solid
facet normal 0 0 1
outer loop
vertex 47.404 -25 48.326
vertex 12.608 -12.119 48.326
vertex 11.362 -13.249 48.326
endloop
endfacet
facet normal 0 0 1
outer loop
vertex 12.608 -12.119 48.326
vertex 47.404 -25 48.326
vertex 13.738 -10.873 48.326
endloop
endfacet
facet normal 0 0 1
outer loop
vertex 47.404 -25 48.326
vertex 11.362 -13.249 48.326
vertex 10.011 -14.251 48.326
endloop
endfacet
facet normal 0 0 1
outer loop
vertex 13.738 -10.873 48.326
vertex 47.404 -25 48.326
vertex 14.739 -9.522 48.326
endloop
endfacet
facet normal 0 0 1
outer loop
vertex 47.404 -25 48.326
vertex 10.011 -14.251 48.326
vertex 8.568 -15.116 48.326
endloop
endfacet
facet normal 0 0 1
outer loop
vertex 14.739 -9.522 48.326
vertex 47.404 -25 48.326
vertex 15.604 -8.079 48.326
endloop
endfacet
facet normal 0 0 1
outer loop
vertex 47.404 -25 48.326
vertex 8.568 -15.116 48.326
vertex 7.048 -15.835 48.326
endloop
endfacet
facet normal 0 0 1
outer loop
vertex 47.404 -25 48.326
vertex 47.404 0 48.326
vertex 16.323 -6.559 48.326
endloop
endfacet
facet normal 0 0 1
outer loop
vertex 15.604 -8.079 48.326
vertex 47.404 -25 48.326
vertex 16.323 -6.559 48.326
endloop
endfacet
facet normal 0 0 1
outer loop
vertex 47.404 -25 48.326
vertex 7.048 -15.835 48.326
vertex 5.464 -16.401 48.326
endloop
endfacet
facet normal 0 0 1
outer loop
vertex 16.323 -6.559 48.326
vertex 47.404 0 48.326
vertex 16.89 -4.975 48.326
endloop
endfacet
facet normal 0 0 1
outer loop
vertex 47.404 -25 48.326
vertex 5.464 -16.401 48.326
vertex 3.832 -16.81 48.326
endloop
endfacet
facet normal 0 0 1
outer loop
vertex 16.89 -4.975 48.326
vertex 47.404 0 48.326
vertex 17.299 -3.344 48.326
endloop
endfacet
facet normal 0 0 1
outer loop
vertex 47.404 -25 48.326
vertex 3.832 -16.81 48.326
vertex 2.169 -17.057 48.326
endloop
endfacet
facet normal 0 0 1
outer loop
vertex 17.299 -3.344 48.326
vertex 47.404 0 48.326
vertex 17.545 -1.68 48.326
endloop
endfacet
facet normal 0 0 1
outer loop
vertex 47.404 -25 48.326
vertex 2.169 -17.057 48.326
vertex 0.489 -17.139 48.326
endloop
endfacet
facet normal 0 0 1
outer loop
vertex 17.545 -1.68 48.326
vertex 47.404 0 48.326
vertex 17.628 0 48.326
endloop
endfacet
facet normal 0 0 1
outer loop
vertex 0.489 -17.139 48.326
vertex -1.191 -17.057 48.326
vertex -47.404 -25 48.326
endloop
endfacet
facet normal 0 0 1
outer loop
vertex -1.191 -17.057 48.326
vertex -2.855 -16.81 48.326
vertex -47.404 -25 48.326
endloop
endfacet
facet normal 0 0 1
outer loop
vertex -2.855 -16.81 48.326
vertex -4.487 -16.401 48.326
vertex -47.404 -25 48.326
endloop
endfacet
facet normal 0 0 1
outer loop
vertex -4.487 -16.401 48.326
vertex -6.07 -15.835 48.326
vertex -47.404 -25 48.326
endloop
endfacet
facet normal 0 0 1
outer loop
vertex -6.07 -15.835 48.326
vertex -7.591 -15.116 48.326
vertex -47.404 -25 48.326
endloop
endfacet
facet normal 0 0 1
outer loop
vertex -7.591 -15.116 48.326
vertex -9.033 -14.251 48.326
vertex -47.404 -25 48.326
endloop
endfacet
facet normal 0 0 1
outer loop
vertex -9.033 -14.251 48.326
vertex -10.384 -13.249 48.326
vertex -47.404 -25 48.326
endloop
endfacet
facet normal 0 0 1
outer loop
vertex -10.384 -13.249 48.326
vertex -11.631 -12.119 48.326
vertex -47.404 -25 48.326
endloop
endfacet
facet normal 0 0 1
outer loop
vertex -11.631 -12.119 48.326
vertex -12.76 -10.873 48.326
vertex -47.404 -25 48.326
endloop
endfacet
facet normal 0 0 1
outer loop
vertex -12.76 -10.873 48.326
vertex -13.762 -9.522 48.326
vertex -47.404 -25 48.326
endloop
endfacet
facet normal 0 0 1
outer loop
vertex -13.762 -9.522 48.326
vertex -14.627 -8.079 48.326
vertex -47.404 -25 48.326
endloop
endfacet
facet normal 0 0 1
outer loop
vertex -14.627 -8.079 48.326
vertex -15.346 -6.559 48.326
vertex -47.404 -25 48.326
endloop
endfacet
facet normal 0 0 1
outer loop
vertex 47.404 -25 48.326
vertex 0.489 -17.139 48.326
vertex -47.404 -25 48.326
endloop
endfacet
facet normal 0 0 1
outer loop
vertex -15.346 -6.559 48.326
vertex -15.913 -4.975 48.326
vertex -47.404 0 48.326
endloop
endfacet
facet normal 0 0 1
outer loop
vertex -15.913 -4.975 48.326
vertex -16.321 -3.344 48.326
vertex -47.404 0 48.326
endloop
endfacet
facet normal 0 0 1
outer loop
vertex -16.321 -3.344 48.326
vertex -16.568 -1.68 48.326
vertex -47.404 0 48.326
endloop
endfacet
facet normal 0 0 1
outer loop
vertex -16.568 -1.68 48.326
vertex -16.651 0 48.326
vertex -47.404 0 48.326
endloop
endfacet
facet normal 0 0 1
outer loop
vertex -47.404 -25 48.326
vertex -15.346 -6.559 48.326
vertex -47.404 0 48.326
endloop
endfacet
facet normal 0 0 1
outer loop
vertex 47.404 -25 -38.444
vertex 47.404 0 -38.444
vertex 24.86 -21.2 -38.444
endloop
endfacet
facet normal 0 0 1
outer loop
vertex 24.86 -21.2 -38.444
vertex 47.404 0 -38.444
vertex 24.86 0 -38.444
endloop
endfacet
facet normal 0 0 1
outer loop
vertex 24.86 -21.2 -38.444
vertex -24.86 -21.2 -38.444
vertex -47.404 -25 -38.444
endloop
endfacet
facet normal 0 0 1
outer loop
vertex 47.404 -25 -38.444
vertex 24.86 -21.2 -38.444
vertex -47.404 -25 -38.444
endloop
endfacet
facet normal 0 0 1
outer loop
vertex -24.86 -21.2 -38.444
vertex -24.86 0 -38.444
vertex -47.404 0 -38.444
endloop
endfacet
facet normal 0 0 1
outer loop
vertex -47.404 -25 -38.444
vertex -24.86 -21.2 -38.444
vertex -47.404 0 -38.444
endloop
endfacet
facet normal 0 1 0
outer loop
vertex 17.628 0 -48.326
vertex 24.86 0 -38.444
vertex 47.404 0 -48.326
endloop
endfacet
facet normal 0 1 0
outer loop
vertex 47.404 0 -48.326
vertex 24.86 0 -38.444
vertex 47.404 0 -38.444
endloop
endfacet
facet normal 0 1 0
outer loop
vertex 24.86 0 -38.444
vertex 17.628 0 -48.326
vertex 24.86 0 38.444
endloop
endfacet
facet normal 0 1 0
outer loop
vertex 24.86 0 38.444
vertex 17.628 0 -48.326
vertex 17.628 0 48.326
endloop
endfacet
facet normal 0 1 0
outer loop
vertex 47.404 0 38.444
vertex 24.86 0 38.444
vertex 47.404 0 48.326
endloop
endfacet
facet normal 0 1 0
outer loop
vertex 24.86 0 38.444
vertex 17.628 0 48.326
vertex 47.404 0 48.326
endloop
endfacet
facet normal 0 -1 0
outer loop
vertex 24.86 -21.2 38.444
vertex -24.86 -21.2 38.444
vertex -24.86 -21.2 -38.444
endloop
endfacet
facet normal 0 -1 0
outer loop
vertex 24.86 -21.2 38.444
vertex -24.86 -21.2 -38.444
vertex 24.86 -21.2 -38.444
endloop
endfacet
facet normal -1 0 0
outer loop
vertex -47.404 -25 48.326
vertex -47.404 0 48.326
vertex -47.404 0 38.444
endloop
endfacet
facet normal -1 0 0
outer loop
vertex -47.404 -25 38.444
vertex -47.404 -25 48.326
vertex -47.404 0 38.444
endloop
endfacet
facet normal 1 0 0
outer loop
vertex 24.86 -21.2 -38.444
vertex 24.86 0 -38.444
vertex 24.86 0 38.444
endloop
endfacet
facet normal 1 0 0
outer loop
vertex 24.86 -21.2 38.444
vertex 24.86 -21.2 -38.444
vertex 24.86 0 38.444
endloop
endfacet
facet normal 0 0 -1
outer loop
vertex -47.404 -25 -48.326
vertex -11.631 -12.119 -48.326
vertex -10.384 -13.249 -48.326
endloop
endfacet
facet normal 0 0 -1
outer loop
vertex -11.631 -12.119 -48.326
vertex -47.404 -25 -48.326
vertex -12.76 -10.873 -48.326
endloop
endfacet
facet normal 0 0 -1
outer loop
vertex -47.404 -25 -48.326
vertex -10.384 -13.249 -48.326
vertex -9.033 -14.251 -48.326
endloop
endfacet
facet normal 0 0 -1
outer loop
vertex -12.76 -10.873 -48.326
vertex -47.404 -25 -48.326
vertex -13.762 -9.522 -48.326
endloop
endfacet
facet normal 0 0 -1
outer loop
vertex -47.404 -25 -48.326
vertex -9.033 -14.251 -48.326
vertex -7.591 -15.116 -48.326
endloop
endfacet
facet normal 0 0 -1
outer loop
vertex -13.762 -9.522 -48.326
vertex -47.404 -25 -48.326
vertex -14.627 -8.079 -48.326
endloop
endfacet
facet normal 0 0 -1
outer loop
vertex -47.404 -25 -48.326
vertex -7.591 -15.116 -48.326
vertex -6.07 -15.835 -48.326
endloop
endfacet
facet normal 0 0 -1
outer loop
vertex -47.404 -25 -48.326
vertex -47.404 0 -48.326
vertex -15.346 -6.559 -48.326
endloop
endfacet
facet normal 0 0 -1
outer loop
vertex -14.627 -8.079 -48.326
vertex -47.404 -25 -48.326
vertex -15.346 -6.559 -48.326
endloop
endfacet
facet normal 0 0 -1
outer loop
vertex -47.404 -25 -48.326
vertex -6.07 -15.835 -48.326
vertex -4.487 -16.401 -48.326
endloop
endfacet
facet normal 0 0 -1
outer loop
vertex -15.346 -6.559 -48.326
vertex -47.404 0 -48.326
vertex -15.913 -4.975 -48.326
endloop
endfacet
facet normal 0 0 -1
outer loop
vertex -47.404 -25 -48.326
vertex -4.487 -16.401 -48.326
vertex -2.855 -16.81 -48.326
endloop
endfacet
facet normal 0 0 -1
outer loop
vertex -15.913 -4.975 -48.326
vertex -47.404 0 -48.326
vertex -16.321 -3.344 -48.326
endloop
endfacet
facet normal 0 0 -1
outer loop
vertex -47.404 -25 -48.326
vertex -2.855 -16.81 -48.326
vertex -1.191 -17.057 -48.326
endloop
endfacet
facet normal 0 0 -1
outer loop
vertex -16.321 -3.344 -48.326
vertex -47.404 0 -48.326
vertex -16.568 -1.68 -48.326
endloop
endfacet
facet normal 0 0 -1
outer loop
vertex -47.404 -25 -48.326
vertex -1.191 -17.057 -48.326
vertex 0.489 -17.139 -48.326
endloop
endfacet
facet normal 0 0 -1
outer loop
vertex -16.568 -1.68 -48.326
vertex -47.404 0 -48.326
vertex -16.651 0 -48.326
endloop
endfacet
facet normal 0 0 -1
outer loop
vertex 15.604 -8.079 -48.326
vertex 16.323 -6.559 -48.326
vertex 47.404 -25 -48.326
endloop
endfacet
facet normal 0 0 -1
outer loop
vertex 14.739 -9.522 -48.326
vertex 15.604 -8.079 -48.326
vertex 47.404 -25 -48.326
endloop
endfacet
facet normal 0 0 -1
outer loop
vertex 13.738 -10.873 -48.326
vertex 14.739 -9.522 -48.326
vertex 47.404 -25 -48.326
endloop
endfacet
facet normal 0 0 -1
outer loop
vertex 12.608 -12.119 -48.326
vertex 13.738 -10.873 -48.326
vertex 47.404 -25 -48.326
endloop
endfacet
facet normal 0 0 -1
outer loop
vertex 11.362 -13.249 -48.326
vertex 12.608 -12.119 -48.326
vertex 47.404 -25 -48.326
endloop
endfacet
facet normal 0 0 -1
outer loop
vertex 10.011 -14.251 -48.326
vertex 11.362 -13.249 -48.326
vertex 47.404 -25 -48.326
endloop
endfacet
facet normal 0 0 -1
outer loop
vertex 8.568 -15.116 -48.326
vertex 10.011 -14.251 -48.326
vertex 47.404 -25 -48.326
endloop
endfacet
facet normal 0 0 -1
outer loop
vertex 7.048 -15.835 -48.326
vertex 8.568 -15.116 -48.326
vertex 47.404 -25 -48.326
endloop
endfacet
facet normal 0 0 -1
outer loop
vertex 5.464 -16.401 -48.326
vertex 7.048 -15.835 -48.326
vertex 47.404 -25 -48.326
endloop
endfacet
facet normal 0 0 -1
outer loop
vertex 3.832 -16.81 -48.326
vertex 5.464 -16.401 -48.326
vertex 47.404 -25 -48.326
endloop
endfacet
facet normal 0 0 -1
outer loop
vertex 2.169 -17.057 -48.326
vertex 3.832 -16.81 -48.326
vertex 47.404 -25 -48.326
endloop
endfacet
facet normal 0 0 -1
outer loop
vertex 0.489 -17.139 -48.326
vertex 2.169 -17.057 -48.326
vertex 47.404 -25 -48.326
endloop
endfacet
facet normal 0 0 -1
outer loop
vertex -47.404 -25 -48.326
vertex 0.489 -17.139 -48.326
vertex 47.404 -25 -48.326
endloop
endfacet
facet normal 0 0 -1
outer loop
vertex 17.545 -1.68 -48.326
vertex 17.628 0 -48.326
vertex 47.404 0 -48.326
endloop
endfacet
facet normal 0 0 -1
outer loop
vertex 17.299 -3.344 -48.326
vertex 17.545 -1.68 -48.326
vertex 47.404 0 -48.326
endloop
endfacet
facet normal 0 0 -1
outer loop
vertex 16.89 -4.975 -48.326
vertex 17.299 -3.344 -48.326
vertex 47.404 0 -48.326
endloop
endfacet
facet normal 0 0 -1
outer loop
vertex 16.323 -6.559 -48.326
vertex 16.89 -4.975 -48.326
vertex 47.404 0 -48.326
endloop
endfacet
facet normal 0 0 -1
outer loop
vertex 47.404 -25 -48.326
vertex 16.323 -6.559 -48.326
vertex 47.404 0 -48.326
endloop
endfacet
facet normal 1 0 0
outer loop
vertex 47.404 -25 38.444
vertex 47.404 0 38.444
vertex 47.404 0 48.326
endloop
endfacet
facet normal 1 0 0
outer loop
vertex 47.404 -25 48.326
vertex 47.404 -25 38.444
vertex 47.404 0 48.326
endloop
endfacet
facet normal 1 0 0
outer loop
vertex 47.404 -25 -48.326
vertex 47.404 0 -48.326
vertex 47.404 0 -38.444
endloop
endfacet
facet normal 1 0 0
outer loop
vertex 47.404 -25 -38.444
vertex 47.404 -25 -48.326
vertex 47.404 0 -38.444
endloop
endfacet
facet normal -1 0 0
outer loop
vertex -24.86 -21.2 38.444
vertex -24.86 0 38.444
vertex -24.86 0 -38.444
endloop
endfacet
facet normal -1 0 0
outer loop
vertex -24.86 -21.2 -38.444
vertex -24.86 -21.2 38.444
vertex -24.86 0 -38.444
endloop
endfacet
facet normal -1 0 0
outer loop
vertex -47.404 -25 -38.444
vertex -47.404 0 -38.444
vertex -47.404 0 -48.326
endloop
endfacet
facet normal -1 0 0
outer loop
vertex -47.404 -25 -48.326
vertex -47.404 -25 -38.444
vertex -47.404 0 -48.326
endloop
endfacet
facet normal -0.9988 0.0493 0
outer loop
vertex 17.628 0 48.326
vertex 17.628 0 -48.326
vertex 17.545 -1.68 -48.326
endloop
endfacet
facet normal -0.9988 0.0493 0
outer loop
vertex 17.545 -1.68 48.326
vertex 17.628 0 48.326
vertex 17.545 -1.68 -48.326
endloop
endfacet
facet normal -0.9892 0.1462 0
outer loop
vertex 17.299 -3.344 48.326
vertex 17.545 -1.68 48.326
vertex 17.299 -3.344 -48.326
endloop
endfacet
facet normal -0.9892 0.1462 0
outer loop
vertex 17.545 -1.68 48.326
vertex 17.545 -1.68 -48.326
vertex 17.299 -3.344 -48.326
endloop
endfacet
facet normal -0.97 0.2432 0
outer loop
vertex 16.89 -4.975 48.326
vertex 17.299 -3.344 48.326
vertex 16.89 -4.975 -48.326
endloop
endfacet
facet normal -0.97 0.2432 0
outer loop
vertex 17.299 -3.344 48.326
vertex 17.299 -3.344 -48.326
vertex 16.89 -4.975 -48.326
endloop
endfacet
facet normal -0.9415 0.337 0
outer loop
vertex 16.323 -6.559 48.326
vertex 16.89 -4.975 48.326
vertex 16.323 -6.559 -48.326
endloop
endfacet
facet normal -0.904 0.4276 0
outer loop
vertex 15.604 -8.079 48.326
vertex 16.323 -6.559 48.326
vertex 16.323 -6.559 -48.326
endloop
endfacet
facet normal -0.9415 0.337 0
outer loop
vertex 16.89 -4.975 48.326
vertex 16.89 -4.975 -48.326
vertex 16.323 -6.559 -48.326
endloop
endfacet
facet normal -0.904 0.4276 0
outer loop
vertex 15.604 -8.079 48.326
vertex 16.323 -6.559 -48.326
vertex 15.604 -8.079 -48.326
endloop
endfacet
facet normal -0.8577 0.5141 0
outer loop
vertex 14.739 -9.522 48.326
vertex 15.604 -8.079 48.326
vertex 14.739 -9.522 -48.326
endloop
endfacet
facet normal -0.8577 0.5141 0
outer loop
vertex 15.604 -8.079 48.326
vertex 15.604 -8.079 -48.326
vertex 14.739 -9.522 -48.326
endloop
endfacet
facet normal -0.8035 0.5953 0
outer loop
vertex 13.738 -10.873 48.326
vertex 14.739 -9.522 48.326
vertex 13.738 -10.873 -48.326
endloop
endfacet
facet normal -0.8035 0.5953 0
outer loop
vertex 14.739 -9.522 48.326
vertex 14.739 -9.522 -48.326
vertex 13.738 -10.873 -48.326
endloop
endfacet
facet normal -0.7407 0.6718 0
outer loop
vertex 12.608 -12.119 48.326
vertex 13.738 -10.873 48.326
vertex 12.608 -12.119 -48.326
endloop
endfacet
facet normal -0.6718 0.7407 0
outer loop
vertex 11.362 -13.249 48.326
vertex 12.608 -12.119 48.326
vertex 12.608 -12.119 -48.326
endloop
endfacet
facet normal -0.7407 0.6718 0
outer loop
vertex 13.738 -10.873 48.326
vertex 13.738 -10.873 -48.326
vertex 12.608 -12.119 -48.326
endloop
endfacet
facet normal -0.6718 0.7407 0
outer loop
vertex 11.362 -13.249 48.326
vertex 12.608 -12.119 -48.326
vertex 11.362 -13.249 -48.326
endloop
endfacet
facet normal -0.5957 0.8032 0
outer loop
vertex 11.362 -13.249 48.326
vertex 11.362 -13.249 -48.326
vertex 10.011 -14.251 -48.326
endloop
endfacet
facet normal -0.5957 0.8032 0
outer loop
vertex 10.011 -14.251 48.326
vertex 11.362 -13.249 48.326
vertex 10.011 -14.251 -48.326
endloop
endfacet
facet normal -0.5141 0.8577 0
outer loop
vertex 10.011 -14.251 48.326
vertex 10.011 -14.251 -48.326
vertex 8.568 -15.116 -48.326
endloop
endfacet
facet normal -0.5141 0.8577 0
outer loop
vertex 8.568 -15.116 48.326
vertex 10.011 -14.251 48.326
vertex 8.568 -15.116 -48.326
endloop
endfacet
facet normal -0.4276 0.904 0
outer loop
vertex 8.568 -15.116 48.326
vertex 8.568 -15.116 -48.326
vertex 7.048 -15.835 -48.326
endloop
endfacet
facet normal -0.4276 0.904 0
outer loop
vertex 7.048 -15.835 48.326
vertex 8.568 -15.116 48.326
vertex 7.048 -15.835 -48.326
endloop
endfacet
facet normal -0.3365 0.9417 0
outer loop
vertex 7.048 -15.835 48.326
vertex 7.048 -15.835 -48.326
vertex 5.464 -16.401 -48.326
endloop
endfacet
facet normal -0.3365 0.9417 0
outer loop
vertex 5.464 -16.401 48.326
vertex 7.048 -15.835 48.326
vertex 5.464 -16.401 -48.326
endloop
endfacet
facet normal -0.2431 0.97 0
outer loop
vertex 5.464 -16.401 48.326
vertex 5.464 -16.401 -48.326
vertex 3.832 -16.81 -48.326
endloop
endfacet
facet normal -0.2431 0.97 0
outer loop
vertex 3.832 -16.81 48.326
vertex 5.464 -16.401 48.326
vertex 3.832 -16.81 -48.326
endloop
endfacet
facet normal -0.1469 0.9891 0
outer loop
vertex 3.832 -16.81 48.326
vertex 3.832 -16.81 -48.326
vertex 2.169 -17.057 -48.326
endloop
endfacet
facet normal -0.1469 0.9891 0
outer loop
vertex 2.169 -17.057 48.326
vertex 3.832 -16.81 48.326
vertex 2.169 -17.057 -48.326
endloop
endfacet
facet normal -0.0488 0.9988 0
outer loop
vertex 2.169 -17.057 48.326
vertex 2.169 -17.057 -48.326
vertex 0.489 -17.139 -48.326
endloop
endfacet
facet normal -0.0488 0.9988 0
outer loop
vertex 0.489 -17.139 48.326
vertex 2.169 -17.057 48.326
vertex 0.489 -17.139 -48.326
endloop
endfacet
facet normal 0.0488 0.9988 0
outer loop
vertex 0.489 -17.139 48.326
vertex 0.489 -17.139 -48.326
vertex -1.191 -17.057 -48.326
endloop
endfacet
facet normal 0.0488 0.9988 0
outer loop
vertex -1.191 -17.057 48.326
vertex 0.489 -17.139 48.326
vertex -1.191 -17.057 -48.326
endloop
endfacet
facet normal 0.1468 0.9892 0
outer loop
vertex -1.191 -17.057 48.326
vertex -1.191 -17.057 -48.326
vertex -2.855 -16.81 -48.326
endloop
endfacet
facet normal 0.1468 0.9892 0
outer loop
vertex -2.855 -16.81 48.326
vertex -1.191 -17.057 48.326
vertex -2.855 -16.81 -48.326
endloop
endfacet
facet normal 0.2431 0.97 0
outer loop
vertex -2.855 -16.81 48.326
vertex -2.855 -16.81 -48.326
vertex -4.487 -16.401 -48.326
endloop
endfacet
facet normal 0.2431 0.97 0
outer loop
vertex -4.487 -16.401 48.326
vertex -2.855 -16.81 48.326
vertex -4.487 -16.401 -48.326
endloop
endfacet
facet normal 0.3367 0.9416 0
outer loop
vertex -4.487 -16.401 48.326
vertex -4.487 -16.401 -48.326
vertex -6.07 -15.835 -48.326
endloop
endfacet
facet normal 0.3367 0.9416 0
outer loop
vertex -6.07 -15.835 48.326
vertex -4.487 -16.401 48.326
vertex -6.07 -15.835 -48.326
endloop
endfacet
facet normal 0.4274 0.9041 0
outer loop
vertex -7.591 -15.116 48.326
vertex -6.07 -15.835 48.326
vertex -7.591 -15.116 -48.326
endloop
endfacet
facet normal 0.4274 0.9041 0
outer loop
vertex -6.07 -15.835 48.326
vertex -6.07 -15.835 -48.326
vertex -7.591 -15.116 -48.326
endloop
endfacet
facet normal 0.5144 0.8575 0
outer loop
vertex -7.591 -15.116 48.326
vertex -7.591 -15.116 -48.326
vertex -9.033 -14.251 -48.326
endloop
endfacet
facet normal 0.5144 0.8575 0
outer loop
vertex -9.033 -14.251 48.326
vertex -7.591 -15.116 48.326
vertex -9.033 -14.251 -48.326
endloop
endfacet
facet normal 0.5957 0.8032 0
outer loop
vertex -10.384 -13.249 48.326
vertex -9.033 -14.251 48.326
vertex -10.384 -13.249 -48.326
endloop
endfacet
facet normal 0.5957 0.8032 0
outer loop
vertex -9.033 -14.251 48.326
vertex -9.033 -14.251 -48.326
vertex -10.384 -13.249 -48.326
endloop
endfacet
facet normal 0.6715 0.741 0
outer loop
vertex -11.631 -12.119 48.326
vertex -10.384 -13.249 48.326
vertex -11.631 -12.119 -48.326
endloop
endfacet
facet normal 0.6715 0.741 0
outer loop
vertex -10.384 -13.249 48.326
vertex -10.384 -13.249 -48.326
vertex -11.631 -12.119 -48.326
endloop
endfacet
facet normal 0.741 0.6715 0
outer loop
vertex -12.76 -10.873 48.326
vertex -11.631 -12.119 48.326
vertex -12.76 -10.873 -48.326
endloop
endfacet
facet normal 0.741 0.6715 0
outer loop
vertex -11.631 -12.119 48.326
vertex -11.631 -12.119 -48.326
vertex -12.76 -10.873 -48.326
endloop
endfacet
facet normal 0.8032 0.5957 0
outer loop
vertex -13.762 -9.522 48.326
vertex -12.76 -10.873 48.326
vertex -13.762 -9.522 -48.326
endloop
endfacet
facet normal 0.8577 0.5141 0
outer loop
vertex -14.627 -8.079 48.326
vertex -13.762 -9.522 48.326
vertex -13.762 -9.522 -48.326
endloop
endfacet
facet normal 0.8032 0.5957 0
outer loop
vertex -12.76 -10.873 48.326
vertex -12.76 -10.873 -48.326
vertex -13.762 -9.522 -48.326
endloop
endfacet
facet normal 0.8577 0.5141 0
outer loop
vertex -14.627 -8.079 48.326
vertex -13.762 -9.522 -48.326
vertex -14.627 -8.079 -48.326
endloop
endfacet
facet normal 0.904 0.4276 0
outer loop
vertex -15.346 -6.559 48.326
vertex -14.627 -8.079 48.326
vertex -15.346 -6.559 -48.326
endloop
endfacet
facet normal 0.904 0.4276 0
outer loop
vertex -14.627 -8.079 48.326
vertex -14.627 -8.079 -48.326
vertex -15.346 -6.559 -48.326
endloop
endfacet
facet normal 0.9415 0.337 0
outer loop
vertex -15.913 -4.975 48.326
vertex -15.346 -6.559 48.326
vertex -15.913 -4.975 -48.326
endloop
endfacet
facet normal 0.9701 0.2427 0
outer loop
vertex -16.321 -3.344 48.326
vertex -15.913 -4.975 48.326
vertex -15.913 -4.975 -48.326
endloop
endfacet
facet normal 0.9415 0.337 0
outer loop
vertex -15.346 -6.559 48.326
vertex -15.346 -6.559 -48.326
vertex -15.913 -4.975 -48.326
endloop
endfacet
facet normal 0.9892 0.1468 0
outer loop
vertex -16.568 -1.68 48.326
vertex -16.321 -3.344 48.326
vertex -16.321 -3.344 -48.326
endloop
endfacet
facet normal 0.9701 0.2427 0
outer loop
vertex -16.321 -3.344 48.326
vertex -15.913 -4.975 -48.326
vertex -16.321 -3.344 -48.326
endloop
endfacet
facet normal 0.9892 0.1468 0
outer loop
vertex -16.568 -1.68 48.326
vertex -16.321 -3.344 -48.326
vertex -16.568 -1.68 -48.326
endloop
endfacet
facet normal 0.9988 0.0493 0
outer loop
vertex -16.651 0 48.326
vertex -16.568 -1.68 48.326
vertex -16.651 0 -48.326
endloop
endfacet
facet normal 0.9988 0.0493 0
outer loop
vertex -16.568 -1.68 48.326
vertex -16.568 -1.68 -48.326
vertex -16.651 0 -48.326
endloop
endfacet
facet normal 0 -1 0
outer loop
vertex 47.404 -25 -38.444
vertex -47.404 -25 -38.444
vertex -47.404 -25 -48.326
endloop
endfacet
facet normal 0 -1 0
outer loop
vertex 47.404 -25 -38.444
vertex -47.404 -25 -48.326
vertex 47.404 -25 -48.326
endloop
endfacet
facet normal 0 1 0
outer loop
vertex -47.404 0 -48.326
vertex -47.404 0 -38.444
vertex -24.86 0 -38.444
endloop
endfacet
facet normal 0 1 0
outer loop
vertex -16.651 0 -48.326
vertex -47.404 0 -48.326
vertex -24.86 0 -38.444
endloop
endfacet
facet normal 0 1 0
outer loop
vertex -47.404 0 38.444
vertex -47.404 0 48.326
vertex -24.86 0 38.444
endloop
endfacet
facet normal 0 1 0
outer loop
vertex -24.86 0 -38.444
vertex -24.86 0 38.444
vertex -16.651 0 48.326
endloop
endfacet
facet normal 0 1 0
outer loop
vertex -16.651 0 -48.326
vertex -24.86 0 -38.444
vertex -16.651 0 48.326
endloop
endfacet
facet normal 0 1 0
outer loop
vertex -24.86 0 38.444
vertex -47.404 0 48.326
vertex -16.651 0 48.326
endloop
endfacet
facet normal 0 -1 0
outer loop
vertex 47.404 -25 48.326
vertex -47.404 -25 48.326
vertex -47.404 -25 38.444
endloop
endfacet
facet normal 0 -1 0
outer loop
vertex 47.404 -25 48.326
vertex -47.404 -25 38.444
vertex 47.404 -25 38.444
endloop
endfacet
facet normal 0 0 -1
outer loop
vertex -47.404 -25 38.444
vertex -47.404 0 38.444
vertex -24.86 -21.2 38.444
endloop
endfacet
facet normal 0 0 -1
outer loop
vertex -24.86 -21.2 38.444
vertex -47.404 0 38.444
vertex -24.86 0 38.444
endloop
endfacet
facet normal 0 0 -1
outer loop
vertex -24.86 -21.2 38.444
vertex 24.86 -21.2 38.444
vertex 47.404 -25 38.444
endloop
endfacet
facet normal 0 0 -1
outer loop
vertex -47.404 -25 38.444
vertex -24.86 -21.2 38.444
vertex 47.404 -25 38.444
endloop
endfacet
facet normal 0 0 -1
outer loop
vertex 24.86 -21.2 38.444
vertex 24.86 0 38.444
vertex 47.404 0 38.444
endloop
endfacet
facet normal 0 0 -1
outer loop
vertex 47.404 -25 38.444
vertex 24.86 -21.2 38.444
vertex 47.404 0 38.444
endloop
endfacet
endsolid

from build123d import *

# Parameters (mm, degrees)
F1_DEPTH = 25
F2_W     = 49.72059
F2_H     = 76.887056
F3_DEPTH = 3.8
F5_DEPTH = 97.5


with BuildPart() as f1:
    # F0 (on Front) → F1 (new body)
    with BuildSketch(Plane.XZ):
        Polygon((0, 48.325881), (-47.404412, 48.325881), (-47.404412, 38.443528), (-24.860295, 38.443528), (-24.860295, 0), (-24.860295, -38.443528), (-47.404412, -38.443528), (-47.404412, -48.325881), (0, -48.325881), (47.404412, -48.325881), (47.404412, -38.443528), (24.860295, -38.443528), (24.860295, 0), (24.860295, 38.443528), (47.404412, 38.443528), (47.404412, 48.325881), align=None)
    extrude(amount=F1_DEPTH)

    # F2 (on face) → F3 (cut)
    with BuildSketch(Plane.XZ.offset(25)):
        Rectangle(F2_W, F2_H)
    extrude(amount=-F3_DEPTH, mode=Mode.SUBTRACT)

    # F4 (on face) → F5 (cut)
    with BuildSketch(Plane(origin=(0, 0, -48.325881), x_dir=(1, 0, 0), z_dir=(0, 0, -1))):
        with BuildLine():
            Line((-16.650641, 0), (17.627948, 0))
            ThreePointArc((17.627948, 0), (0.488654, 17.139295), (-16.650641, 0))
        make_face()
    extrude(amount=-F5_DEPTH, mode=Mode.SUBTRACT)


solid = f1.part
